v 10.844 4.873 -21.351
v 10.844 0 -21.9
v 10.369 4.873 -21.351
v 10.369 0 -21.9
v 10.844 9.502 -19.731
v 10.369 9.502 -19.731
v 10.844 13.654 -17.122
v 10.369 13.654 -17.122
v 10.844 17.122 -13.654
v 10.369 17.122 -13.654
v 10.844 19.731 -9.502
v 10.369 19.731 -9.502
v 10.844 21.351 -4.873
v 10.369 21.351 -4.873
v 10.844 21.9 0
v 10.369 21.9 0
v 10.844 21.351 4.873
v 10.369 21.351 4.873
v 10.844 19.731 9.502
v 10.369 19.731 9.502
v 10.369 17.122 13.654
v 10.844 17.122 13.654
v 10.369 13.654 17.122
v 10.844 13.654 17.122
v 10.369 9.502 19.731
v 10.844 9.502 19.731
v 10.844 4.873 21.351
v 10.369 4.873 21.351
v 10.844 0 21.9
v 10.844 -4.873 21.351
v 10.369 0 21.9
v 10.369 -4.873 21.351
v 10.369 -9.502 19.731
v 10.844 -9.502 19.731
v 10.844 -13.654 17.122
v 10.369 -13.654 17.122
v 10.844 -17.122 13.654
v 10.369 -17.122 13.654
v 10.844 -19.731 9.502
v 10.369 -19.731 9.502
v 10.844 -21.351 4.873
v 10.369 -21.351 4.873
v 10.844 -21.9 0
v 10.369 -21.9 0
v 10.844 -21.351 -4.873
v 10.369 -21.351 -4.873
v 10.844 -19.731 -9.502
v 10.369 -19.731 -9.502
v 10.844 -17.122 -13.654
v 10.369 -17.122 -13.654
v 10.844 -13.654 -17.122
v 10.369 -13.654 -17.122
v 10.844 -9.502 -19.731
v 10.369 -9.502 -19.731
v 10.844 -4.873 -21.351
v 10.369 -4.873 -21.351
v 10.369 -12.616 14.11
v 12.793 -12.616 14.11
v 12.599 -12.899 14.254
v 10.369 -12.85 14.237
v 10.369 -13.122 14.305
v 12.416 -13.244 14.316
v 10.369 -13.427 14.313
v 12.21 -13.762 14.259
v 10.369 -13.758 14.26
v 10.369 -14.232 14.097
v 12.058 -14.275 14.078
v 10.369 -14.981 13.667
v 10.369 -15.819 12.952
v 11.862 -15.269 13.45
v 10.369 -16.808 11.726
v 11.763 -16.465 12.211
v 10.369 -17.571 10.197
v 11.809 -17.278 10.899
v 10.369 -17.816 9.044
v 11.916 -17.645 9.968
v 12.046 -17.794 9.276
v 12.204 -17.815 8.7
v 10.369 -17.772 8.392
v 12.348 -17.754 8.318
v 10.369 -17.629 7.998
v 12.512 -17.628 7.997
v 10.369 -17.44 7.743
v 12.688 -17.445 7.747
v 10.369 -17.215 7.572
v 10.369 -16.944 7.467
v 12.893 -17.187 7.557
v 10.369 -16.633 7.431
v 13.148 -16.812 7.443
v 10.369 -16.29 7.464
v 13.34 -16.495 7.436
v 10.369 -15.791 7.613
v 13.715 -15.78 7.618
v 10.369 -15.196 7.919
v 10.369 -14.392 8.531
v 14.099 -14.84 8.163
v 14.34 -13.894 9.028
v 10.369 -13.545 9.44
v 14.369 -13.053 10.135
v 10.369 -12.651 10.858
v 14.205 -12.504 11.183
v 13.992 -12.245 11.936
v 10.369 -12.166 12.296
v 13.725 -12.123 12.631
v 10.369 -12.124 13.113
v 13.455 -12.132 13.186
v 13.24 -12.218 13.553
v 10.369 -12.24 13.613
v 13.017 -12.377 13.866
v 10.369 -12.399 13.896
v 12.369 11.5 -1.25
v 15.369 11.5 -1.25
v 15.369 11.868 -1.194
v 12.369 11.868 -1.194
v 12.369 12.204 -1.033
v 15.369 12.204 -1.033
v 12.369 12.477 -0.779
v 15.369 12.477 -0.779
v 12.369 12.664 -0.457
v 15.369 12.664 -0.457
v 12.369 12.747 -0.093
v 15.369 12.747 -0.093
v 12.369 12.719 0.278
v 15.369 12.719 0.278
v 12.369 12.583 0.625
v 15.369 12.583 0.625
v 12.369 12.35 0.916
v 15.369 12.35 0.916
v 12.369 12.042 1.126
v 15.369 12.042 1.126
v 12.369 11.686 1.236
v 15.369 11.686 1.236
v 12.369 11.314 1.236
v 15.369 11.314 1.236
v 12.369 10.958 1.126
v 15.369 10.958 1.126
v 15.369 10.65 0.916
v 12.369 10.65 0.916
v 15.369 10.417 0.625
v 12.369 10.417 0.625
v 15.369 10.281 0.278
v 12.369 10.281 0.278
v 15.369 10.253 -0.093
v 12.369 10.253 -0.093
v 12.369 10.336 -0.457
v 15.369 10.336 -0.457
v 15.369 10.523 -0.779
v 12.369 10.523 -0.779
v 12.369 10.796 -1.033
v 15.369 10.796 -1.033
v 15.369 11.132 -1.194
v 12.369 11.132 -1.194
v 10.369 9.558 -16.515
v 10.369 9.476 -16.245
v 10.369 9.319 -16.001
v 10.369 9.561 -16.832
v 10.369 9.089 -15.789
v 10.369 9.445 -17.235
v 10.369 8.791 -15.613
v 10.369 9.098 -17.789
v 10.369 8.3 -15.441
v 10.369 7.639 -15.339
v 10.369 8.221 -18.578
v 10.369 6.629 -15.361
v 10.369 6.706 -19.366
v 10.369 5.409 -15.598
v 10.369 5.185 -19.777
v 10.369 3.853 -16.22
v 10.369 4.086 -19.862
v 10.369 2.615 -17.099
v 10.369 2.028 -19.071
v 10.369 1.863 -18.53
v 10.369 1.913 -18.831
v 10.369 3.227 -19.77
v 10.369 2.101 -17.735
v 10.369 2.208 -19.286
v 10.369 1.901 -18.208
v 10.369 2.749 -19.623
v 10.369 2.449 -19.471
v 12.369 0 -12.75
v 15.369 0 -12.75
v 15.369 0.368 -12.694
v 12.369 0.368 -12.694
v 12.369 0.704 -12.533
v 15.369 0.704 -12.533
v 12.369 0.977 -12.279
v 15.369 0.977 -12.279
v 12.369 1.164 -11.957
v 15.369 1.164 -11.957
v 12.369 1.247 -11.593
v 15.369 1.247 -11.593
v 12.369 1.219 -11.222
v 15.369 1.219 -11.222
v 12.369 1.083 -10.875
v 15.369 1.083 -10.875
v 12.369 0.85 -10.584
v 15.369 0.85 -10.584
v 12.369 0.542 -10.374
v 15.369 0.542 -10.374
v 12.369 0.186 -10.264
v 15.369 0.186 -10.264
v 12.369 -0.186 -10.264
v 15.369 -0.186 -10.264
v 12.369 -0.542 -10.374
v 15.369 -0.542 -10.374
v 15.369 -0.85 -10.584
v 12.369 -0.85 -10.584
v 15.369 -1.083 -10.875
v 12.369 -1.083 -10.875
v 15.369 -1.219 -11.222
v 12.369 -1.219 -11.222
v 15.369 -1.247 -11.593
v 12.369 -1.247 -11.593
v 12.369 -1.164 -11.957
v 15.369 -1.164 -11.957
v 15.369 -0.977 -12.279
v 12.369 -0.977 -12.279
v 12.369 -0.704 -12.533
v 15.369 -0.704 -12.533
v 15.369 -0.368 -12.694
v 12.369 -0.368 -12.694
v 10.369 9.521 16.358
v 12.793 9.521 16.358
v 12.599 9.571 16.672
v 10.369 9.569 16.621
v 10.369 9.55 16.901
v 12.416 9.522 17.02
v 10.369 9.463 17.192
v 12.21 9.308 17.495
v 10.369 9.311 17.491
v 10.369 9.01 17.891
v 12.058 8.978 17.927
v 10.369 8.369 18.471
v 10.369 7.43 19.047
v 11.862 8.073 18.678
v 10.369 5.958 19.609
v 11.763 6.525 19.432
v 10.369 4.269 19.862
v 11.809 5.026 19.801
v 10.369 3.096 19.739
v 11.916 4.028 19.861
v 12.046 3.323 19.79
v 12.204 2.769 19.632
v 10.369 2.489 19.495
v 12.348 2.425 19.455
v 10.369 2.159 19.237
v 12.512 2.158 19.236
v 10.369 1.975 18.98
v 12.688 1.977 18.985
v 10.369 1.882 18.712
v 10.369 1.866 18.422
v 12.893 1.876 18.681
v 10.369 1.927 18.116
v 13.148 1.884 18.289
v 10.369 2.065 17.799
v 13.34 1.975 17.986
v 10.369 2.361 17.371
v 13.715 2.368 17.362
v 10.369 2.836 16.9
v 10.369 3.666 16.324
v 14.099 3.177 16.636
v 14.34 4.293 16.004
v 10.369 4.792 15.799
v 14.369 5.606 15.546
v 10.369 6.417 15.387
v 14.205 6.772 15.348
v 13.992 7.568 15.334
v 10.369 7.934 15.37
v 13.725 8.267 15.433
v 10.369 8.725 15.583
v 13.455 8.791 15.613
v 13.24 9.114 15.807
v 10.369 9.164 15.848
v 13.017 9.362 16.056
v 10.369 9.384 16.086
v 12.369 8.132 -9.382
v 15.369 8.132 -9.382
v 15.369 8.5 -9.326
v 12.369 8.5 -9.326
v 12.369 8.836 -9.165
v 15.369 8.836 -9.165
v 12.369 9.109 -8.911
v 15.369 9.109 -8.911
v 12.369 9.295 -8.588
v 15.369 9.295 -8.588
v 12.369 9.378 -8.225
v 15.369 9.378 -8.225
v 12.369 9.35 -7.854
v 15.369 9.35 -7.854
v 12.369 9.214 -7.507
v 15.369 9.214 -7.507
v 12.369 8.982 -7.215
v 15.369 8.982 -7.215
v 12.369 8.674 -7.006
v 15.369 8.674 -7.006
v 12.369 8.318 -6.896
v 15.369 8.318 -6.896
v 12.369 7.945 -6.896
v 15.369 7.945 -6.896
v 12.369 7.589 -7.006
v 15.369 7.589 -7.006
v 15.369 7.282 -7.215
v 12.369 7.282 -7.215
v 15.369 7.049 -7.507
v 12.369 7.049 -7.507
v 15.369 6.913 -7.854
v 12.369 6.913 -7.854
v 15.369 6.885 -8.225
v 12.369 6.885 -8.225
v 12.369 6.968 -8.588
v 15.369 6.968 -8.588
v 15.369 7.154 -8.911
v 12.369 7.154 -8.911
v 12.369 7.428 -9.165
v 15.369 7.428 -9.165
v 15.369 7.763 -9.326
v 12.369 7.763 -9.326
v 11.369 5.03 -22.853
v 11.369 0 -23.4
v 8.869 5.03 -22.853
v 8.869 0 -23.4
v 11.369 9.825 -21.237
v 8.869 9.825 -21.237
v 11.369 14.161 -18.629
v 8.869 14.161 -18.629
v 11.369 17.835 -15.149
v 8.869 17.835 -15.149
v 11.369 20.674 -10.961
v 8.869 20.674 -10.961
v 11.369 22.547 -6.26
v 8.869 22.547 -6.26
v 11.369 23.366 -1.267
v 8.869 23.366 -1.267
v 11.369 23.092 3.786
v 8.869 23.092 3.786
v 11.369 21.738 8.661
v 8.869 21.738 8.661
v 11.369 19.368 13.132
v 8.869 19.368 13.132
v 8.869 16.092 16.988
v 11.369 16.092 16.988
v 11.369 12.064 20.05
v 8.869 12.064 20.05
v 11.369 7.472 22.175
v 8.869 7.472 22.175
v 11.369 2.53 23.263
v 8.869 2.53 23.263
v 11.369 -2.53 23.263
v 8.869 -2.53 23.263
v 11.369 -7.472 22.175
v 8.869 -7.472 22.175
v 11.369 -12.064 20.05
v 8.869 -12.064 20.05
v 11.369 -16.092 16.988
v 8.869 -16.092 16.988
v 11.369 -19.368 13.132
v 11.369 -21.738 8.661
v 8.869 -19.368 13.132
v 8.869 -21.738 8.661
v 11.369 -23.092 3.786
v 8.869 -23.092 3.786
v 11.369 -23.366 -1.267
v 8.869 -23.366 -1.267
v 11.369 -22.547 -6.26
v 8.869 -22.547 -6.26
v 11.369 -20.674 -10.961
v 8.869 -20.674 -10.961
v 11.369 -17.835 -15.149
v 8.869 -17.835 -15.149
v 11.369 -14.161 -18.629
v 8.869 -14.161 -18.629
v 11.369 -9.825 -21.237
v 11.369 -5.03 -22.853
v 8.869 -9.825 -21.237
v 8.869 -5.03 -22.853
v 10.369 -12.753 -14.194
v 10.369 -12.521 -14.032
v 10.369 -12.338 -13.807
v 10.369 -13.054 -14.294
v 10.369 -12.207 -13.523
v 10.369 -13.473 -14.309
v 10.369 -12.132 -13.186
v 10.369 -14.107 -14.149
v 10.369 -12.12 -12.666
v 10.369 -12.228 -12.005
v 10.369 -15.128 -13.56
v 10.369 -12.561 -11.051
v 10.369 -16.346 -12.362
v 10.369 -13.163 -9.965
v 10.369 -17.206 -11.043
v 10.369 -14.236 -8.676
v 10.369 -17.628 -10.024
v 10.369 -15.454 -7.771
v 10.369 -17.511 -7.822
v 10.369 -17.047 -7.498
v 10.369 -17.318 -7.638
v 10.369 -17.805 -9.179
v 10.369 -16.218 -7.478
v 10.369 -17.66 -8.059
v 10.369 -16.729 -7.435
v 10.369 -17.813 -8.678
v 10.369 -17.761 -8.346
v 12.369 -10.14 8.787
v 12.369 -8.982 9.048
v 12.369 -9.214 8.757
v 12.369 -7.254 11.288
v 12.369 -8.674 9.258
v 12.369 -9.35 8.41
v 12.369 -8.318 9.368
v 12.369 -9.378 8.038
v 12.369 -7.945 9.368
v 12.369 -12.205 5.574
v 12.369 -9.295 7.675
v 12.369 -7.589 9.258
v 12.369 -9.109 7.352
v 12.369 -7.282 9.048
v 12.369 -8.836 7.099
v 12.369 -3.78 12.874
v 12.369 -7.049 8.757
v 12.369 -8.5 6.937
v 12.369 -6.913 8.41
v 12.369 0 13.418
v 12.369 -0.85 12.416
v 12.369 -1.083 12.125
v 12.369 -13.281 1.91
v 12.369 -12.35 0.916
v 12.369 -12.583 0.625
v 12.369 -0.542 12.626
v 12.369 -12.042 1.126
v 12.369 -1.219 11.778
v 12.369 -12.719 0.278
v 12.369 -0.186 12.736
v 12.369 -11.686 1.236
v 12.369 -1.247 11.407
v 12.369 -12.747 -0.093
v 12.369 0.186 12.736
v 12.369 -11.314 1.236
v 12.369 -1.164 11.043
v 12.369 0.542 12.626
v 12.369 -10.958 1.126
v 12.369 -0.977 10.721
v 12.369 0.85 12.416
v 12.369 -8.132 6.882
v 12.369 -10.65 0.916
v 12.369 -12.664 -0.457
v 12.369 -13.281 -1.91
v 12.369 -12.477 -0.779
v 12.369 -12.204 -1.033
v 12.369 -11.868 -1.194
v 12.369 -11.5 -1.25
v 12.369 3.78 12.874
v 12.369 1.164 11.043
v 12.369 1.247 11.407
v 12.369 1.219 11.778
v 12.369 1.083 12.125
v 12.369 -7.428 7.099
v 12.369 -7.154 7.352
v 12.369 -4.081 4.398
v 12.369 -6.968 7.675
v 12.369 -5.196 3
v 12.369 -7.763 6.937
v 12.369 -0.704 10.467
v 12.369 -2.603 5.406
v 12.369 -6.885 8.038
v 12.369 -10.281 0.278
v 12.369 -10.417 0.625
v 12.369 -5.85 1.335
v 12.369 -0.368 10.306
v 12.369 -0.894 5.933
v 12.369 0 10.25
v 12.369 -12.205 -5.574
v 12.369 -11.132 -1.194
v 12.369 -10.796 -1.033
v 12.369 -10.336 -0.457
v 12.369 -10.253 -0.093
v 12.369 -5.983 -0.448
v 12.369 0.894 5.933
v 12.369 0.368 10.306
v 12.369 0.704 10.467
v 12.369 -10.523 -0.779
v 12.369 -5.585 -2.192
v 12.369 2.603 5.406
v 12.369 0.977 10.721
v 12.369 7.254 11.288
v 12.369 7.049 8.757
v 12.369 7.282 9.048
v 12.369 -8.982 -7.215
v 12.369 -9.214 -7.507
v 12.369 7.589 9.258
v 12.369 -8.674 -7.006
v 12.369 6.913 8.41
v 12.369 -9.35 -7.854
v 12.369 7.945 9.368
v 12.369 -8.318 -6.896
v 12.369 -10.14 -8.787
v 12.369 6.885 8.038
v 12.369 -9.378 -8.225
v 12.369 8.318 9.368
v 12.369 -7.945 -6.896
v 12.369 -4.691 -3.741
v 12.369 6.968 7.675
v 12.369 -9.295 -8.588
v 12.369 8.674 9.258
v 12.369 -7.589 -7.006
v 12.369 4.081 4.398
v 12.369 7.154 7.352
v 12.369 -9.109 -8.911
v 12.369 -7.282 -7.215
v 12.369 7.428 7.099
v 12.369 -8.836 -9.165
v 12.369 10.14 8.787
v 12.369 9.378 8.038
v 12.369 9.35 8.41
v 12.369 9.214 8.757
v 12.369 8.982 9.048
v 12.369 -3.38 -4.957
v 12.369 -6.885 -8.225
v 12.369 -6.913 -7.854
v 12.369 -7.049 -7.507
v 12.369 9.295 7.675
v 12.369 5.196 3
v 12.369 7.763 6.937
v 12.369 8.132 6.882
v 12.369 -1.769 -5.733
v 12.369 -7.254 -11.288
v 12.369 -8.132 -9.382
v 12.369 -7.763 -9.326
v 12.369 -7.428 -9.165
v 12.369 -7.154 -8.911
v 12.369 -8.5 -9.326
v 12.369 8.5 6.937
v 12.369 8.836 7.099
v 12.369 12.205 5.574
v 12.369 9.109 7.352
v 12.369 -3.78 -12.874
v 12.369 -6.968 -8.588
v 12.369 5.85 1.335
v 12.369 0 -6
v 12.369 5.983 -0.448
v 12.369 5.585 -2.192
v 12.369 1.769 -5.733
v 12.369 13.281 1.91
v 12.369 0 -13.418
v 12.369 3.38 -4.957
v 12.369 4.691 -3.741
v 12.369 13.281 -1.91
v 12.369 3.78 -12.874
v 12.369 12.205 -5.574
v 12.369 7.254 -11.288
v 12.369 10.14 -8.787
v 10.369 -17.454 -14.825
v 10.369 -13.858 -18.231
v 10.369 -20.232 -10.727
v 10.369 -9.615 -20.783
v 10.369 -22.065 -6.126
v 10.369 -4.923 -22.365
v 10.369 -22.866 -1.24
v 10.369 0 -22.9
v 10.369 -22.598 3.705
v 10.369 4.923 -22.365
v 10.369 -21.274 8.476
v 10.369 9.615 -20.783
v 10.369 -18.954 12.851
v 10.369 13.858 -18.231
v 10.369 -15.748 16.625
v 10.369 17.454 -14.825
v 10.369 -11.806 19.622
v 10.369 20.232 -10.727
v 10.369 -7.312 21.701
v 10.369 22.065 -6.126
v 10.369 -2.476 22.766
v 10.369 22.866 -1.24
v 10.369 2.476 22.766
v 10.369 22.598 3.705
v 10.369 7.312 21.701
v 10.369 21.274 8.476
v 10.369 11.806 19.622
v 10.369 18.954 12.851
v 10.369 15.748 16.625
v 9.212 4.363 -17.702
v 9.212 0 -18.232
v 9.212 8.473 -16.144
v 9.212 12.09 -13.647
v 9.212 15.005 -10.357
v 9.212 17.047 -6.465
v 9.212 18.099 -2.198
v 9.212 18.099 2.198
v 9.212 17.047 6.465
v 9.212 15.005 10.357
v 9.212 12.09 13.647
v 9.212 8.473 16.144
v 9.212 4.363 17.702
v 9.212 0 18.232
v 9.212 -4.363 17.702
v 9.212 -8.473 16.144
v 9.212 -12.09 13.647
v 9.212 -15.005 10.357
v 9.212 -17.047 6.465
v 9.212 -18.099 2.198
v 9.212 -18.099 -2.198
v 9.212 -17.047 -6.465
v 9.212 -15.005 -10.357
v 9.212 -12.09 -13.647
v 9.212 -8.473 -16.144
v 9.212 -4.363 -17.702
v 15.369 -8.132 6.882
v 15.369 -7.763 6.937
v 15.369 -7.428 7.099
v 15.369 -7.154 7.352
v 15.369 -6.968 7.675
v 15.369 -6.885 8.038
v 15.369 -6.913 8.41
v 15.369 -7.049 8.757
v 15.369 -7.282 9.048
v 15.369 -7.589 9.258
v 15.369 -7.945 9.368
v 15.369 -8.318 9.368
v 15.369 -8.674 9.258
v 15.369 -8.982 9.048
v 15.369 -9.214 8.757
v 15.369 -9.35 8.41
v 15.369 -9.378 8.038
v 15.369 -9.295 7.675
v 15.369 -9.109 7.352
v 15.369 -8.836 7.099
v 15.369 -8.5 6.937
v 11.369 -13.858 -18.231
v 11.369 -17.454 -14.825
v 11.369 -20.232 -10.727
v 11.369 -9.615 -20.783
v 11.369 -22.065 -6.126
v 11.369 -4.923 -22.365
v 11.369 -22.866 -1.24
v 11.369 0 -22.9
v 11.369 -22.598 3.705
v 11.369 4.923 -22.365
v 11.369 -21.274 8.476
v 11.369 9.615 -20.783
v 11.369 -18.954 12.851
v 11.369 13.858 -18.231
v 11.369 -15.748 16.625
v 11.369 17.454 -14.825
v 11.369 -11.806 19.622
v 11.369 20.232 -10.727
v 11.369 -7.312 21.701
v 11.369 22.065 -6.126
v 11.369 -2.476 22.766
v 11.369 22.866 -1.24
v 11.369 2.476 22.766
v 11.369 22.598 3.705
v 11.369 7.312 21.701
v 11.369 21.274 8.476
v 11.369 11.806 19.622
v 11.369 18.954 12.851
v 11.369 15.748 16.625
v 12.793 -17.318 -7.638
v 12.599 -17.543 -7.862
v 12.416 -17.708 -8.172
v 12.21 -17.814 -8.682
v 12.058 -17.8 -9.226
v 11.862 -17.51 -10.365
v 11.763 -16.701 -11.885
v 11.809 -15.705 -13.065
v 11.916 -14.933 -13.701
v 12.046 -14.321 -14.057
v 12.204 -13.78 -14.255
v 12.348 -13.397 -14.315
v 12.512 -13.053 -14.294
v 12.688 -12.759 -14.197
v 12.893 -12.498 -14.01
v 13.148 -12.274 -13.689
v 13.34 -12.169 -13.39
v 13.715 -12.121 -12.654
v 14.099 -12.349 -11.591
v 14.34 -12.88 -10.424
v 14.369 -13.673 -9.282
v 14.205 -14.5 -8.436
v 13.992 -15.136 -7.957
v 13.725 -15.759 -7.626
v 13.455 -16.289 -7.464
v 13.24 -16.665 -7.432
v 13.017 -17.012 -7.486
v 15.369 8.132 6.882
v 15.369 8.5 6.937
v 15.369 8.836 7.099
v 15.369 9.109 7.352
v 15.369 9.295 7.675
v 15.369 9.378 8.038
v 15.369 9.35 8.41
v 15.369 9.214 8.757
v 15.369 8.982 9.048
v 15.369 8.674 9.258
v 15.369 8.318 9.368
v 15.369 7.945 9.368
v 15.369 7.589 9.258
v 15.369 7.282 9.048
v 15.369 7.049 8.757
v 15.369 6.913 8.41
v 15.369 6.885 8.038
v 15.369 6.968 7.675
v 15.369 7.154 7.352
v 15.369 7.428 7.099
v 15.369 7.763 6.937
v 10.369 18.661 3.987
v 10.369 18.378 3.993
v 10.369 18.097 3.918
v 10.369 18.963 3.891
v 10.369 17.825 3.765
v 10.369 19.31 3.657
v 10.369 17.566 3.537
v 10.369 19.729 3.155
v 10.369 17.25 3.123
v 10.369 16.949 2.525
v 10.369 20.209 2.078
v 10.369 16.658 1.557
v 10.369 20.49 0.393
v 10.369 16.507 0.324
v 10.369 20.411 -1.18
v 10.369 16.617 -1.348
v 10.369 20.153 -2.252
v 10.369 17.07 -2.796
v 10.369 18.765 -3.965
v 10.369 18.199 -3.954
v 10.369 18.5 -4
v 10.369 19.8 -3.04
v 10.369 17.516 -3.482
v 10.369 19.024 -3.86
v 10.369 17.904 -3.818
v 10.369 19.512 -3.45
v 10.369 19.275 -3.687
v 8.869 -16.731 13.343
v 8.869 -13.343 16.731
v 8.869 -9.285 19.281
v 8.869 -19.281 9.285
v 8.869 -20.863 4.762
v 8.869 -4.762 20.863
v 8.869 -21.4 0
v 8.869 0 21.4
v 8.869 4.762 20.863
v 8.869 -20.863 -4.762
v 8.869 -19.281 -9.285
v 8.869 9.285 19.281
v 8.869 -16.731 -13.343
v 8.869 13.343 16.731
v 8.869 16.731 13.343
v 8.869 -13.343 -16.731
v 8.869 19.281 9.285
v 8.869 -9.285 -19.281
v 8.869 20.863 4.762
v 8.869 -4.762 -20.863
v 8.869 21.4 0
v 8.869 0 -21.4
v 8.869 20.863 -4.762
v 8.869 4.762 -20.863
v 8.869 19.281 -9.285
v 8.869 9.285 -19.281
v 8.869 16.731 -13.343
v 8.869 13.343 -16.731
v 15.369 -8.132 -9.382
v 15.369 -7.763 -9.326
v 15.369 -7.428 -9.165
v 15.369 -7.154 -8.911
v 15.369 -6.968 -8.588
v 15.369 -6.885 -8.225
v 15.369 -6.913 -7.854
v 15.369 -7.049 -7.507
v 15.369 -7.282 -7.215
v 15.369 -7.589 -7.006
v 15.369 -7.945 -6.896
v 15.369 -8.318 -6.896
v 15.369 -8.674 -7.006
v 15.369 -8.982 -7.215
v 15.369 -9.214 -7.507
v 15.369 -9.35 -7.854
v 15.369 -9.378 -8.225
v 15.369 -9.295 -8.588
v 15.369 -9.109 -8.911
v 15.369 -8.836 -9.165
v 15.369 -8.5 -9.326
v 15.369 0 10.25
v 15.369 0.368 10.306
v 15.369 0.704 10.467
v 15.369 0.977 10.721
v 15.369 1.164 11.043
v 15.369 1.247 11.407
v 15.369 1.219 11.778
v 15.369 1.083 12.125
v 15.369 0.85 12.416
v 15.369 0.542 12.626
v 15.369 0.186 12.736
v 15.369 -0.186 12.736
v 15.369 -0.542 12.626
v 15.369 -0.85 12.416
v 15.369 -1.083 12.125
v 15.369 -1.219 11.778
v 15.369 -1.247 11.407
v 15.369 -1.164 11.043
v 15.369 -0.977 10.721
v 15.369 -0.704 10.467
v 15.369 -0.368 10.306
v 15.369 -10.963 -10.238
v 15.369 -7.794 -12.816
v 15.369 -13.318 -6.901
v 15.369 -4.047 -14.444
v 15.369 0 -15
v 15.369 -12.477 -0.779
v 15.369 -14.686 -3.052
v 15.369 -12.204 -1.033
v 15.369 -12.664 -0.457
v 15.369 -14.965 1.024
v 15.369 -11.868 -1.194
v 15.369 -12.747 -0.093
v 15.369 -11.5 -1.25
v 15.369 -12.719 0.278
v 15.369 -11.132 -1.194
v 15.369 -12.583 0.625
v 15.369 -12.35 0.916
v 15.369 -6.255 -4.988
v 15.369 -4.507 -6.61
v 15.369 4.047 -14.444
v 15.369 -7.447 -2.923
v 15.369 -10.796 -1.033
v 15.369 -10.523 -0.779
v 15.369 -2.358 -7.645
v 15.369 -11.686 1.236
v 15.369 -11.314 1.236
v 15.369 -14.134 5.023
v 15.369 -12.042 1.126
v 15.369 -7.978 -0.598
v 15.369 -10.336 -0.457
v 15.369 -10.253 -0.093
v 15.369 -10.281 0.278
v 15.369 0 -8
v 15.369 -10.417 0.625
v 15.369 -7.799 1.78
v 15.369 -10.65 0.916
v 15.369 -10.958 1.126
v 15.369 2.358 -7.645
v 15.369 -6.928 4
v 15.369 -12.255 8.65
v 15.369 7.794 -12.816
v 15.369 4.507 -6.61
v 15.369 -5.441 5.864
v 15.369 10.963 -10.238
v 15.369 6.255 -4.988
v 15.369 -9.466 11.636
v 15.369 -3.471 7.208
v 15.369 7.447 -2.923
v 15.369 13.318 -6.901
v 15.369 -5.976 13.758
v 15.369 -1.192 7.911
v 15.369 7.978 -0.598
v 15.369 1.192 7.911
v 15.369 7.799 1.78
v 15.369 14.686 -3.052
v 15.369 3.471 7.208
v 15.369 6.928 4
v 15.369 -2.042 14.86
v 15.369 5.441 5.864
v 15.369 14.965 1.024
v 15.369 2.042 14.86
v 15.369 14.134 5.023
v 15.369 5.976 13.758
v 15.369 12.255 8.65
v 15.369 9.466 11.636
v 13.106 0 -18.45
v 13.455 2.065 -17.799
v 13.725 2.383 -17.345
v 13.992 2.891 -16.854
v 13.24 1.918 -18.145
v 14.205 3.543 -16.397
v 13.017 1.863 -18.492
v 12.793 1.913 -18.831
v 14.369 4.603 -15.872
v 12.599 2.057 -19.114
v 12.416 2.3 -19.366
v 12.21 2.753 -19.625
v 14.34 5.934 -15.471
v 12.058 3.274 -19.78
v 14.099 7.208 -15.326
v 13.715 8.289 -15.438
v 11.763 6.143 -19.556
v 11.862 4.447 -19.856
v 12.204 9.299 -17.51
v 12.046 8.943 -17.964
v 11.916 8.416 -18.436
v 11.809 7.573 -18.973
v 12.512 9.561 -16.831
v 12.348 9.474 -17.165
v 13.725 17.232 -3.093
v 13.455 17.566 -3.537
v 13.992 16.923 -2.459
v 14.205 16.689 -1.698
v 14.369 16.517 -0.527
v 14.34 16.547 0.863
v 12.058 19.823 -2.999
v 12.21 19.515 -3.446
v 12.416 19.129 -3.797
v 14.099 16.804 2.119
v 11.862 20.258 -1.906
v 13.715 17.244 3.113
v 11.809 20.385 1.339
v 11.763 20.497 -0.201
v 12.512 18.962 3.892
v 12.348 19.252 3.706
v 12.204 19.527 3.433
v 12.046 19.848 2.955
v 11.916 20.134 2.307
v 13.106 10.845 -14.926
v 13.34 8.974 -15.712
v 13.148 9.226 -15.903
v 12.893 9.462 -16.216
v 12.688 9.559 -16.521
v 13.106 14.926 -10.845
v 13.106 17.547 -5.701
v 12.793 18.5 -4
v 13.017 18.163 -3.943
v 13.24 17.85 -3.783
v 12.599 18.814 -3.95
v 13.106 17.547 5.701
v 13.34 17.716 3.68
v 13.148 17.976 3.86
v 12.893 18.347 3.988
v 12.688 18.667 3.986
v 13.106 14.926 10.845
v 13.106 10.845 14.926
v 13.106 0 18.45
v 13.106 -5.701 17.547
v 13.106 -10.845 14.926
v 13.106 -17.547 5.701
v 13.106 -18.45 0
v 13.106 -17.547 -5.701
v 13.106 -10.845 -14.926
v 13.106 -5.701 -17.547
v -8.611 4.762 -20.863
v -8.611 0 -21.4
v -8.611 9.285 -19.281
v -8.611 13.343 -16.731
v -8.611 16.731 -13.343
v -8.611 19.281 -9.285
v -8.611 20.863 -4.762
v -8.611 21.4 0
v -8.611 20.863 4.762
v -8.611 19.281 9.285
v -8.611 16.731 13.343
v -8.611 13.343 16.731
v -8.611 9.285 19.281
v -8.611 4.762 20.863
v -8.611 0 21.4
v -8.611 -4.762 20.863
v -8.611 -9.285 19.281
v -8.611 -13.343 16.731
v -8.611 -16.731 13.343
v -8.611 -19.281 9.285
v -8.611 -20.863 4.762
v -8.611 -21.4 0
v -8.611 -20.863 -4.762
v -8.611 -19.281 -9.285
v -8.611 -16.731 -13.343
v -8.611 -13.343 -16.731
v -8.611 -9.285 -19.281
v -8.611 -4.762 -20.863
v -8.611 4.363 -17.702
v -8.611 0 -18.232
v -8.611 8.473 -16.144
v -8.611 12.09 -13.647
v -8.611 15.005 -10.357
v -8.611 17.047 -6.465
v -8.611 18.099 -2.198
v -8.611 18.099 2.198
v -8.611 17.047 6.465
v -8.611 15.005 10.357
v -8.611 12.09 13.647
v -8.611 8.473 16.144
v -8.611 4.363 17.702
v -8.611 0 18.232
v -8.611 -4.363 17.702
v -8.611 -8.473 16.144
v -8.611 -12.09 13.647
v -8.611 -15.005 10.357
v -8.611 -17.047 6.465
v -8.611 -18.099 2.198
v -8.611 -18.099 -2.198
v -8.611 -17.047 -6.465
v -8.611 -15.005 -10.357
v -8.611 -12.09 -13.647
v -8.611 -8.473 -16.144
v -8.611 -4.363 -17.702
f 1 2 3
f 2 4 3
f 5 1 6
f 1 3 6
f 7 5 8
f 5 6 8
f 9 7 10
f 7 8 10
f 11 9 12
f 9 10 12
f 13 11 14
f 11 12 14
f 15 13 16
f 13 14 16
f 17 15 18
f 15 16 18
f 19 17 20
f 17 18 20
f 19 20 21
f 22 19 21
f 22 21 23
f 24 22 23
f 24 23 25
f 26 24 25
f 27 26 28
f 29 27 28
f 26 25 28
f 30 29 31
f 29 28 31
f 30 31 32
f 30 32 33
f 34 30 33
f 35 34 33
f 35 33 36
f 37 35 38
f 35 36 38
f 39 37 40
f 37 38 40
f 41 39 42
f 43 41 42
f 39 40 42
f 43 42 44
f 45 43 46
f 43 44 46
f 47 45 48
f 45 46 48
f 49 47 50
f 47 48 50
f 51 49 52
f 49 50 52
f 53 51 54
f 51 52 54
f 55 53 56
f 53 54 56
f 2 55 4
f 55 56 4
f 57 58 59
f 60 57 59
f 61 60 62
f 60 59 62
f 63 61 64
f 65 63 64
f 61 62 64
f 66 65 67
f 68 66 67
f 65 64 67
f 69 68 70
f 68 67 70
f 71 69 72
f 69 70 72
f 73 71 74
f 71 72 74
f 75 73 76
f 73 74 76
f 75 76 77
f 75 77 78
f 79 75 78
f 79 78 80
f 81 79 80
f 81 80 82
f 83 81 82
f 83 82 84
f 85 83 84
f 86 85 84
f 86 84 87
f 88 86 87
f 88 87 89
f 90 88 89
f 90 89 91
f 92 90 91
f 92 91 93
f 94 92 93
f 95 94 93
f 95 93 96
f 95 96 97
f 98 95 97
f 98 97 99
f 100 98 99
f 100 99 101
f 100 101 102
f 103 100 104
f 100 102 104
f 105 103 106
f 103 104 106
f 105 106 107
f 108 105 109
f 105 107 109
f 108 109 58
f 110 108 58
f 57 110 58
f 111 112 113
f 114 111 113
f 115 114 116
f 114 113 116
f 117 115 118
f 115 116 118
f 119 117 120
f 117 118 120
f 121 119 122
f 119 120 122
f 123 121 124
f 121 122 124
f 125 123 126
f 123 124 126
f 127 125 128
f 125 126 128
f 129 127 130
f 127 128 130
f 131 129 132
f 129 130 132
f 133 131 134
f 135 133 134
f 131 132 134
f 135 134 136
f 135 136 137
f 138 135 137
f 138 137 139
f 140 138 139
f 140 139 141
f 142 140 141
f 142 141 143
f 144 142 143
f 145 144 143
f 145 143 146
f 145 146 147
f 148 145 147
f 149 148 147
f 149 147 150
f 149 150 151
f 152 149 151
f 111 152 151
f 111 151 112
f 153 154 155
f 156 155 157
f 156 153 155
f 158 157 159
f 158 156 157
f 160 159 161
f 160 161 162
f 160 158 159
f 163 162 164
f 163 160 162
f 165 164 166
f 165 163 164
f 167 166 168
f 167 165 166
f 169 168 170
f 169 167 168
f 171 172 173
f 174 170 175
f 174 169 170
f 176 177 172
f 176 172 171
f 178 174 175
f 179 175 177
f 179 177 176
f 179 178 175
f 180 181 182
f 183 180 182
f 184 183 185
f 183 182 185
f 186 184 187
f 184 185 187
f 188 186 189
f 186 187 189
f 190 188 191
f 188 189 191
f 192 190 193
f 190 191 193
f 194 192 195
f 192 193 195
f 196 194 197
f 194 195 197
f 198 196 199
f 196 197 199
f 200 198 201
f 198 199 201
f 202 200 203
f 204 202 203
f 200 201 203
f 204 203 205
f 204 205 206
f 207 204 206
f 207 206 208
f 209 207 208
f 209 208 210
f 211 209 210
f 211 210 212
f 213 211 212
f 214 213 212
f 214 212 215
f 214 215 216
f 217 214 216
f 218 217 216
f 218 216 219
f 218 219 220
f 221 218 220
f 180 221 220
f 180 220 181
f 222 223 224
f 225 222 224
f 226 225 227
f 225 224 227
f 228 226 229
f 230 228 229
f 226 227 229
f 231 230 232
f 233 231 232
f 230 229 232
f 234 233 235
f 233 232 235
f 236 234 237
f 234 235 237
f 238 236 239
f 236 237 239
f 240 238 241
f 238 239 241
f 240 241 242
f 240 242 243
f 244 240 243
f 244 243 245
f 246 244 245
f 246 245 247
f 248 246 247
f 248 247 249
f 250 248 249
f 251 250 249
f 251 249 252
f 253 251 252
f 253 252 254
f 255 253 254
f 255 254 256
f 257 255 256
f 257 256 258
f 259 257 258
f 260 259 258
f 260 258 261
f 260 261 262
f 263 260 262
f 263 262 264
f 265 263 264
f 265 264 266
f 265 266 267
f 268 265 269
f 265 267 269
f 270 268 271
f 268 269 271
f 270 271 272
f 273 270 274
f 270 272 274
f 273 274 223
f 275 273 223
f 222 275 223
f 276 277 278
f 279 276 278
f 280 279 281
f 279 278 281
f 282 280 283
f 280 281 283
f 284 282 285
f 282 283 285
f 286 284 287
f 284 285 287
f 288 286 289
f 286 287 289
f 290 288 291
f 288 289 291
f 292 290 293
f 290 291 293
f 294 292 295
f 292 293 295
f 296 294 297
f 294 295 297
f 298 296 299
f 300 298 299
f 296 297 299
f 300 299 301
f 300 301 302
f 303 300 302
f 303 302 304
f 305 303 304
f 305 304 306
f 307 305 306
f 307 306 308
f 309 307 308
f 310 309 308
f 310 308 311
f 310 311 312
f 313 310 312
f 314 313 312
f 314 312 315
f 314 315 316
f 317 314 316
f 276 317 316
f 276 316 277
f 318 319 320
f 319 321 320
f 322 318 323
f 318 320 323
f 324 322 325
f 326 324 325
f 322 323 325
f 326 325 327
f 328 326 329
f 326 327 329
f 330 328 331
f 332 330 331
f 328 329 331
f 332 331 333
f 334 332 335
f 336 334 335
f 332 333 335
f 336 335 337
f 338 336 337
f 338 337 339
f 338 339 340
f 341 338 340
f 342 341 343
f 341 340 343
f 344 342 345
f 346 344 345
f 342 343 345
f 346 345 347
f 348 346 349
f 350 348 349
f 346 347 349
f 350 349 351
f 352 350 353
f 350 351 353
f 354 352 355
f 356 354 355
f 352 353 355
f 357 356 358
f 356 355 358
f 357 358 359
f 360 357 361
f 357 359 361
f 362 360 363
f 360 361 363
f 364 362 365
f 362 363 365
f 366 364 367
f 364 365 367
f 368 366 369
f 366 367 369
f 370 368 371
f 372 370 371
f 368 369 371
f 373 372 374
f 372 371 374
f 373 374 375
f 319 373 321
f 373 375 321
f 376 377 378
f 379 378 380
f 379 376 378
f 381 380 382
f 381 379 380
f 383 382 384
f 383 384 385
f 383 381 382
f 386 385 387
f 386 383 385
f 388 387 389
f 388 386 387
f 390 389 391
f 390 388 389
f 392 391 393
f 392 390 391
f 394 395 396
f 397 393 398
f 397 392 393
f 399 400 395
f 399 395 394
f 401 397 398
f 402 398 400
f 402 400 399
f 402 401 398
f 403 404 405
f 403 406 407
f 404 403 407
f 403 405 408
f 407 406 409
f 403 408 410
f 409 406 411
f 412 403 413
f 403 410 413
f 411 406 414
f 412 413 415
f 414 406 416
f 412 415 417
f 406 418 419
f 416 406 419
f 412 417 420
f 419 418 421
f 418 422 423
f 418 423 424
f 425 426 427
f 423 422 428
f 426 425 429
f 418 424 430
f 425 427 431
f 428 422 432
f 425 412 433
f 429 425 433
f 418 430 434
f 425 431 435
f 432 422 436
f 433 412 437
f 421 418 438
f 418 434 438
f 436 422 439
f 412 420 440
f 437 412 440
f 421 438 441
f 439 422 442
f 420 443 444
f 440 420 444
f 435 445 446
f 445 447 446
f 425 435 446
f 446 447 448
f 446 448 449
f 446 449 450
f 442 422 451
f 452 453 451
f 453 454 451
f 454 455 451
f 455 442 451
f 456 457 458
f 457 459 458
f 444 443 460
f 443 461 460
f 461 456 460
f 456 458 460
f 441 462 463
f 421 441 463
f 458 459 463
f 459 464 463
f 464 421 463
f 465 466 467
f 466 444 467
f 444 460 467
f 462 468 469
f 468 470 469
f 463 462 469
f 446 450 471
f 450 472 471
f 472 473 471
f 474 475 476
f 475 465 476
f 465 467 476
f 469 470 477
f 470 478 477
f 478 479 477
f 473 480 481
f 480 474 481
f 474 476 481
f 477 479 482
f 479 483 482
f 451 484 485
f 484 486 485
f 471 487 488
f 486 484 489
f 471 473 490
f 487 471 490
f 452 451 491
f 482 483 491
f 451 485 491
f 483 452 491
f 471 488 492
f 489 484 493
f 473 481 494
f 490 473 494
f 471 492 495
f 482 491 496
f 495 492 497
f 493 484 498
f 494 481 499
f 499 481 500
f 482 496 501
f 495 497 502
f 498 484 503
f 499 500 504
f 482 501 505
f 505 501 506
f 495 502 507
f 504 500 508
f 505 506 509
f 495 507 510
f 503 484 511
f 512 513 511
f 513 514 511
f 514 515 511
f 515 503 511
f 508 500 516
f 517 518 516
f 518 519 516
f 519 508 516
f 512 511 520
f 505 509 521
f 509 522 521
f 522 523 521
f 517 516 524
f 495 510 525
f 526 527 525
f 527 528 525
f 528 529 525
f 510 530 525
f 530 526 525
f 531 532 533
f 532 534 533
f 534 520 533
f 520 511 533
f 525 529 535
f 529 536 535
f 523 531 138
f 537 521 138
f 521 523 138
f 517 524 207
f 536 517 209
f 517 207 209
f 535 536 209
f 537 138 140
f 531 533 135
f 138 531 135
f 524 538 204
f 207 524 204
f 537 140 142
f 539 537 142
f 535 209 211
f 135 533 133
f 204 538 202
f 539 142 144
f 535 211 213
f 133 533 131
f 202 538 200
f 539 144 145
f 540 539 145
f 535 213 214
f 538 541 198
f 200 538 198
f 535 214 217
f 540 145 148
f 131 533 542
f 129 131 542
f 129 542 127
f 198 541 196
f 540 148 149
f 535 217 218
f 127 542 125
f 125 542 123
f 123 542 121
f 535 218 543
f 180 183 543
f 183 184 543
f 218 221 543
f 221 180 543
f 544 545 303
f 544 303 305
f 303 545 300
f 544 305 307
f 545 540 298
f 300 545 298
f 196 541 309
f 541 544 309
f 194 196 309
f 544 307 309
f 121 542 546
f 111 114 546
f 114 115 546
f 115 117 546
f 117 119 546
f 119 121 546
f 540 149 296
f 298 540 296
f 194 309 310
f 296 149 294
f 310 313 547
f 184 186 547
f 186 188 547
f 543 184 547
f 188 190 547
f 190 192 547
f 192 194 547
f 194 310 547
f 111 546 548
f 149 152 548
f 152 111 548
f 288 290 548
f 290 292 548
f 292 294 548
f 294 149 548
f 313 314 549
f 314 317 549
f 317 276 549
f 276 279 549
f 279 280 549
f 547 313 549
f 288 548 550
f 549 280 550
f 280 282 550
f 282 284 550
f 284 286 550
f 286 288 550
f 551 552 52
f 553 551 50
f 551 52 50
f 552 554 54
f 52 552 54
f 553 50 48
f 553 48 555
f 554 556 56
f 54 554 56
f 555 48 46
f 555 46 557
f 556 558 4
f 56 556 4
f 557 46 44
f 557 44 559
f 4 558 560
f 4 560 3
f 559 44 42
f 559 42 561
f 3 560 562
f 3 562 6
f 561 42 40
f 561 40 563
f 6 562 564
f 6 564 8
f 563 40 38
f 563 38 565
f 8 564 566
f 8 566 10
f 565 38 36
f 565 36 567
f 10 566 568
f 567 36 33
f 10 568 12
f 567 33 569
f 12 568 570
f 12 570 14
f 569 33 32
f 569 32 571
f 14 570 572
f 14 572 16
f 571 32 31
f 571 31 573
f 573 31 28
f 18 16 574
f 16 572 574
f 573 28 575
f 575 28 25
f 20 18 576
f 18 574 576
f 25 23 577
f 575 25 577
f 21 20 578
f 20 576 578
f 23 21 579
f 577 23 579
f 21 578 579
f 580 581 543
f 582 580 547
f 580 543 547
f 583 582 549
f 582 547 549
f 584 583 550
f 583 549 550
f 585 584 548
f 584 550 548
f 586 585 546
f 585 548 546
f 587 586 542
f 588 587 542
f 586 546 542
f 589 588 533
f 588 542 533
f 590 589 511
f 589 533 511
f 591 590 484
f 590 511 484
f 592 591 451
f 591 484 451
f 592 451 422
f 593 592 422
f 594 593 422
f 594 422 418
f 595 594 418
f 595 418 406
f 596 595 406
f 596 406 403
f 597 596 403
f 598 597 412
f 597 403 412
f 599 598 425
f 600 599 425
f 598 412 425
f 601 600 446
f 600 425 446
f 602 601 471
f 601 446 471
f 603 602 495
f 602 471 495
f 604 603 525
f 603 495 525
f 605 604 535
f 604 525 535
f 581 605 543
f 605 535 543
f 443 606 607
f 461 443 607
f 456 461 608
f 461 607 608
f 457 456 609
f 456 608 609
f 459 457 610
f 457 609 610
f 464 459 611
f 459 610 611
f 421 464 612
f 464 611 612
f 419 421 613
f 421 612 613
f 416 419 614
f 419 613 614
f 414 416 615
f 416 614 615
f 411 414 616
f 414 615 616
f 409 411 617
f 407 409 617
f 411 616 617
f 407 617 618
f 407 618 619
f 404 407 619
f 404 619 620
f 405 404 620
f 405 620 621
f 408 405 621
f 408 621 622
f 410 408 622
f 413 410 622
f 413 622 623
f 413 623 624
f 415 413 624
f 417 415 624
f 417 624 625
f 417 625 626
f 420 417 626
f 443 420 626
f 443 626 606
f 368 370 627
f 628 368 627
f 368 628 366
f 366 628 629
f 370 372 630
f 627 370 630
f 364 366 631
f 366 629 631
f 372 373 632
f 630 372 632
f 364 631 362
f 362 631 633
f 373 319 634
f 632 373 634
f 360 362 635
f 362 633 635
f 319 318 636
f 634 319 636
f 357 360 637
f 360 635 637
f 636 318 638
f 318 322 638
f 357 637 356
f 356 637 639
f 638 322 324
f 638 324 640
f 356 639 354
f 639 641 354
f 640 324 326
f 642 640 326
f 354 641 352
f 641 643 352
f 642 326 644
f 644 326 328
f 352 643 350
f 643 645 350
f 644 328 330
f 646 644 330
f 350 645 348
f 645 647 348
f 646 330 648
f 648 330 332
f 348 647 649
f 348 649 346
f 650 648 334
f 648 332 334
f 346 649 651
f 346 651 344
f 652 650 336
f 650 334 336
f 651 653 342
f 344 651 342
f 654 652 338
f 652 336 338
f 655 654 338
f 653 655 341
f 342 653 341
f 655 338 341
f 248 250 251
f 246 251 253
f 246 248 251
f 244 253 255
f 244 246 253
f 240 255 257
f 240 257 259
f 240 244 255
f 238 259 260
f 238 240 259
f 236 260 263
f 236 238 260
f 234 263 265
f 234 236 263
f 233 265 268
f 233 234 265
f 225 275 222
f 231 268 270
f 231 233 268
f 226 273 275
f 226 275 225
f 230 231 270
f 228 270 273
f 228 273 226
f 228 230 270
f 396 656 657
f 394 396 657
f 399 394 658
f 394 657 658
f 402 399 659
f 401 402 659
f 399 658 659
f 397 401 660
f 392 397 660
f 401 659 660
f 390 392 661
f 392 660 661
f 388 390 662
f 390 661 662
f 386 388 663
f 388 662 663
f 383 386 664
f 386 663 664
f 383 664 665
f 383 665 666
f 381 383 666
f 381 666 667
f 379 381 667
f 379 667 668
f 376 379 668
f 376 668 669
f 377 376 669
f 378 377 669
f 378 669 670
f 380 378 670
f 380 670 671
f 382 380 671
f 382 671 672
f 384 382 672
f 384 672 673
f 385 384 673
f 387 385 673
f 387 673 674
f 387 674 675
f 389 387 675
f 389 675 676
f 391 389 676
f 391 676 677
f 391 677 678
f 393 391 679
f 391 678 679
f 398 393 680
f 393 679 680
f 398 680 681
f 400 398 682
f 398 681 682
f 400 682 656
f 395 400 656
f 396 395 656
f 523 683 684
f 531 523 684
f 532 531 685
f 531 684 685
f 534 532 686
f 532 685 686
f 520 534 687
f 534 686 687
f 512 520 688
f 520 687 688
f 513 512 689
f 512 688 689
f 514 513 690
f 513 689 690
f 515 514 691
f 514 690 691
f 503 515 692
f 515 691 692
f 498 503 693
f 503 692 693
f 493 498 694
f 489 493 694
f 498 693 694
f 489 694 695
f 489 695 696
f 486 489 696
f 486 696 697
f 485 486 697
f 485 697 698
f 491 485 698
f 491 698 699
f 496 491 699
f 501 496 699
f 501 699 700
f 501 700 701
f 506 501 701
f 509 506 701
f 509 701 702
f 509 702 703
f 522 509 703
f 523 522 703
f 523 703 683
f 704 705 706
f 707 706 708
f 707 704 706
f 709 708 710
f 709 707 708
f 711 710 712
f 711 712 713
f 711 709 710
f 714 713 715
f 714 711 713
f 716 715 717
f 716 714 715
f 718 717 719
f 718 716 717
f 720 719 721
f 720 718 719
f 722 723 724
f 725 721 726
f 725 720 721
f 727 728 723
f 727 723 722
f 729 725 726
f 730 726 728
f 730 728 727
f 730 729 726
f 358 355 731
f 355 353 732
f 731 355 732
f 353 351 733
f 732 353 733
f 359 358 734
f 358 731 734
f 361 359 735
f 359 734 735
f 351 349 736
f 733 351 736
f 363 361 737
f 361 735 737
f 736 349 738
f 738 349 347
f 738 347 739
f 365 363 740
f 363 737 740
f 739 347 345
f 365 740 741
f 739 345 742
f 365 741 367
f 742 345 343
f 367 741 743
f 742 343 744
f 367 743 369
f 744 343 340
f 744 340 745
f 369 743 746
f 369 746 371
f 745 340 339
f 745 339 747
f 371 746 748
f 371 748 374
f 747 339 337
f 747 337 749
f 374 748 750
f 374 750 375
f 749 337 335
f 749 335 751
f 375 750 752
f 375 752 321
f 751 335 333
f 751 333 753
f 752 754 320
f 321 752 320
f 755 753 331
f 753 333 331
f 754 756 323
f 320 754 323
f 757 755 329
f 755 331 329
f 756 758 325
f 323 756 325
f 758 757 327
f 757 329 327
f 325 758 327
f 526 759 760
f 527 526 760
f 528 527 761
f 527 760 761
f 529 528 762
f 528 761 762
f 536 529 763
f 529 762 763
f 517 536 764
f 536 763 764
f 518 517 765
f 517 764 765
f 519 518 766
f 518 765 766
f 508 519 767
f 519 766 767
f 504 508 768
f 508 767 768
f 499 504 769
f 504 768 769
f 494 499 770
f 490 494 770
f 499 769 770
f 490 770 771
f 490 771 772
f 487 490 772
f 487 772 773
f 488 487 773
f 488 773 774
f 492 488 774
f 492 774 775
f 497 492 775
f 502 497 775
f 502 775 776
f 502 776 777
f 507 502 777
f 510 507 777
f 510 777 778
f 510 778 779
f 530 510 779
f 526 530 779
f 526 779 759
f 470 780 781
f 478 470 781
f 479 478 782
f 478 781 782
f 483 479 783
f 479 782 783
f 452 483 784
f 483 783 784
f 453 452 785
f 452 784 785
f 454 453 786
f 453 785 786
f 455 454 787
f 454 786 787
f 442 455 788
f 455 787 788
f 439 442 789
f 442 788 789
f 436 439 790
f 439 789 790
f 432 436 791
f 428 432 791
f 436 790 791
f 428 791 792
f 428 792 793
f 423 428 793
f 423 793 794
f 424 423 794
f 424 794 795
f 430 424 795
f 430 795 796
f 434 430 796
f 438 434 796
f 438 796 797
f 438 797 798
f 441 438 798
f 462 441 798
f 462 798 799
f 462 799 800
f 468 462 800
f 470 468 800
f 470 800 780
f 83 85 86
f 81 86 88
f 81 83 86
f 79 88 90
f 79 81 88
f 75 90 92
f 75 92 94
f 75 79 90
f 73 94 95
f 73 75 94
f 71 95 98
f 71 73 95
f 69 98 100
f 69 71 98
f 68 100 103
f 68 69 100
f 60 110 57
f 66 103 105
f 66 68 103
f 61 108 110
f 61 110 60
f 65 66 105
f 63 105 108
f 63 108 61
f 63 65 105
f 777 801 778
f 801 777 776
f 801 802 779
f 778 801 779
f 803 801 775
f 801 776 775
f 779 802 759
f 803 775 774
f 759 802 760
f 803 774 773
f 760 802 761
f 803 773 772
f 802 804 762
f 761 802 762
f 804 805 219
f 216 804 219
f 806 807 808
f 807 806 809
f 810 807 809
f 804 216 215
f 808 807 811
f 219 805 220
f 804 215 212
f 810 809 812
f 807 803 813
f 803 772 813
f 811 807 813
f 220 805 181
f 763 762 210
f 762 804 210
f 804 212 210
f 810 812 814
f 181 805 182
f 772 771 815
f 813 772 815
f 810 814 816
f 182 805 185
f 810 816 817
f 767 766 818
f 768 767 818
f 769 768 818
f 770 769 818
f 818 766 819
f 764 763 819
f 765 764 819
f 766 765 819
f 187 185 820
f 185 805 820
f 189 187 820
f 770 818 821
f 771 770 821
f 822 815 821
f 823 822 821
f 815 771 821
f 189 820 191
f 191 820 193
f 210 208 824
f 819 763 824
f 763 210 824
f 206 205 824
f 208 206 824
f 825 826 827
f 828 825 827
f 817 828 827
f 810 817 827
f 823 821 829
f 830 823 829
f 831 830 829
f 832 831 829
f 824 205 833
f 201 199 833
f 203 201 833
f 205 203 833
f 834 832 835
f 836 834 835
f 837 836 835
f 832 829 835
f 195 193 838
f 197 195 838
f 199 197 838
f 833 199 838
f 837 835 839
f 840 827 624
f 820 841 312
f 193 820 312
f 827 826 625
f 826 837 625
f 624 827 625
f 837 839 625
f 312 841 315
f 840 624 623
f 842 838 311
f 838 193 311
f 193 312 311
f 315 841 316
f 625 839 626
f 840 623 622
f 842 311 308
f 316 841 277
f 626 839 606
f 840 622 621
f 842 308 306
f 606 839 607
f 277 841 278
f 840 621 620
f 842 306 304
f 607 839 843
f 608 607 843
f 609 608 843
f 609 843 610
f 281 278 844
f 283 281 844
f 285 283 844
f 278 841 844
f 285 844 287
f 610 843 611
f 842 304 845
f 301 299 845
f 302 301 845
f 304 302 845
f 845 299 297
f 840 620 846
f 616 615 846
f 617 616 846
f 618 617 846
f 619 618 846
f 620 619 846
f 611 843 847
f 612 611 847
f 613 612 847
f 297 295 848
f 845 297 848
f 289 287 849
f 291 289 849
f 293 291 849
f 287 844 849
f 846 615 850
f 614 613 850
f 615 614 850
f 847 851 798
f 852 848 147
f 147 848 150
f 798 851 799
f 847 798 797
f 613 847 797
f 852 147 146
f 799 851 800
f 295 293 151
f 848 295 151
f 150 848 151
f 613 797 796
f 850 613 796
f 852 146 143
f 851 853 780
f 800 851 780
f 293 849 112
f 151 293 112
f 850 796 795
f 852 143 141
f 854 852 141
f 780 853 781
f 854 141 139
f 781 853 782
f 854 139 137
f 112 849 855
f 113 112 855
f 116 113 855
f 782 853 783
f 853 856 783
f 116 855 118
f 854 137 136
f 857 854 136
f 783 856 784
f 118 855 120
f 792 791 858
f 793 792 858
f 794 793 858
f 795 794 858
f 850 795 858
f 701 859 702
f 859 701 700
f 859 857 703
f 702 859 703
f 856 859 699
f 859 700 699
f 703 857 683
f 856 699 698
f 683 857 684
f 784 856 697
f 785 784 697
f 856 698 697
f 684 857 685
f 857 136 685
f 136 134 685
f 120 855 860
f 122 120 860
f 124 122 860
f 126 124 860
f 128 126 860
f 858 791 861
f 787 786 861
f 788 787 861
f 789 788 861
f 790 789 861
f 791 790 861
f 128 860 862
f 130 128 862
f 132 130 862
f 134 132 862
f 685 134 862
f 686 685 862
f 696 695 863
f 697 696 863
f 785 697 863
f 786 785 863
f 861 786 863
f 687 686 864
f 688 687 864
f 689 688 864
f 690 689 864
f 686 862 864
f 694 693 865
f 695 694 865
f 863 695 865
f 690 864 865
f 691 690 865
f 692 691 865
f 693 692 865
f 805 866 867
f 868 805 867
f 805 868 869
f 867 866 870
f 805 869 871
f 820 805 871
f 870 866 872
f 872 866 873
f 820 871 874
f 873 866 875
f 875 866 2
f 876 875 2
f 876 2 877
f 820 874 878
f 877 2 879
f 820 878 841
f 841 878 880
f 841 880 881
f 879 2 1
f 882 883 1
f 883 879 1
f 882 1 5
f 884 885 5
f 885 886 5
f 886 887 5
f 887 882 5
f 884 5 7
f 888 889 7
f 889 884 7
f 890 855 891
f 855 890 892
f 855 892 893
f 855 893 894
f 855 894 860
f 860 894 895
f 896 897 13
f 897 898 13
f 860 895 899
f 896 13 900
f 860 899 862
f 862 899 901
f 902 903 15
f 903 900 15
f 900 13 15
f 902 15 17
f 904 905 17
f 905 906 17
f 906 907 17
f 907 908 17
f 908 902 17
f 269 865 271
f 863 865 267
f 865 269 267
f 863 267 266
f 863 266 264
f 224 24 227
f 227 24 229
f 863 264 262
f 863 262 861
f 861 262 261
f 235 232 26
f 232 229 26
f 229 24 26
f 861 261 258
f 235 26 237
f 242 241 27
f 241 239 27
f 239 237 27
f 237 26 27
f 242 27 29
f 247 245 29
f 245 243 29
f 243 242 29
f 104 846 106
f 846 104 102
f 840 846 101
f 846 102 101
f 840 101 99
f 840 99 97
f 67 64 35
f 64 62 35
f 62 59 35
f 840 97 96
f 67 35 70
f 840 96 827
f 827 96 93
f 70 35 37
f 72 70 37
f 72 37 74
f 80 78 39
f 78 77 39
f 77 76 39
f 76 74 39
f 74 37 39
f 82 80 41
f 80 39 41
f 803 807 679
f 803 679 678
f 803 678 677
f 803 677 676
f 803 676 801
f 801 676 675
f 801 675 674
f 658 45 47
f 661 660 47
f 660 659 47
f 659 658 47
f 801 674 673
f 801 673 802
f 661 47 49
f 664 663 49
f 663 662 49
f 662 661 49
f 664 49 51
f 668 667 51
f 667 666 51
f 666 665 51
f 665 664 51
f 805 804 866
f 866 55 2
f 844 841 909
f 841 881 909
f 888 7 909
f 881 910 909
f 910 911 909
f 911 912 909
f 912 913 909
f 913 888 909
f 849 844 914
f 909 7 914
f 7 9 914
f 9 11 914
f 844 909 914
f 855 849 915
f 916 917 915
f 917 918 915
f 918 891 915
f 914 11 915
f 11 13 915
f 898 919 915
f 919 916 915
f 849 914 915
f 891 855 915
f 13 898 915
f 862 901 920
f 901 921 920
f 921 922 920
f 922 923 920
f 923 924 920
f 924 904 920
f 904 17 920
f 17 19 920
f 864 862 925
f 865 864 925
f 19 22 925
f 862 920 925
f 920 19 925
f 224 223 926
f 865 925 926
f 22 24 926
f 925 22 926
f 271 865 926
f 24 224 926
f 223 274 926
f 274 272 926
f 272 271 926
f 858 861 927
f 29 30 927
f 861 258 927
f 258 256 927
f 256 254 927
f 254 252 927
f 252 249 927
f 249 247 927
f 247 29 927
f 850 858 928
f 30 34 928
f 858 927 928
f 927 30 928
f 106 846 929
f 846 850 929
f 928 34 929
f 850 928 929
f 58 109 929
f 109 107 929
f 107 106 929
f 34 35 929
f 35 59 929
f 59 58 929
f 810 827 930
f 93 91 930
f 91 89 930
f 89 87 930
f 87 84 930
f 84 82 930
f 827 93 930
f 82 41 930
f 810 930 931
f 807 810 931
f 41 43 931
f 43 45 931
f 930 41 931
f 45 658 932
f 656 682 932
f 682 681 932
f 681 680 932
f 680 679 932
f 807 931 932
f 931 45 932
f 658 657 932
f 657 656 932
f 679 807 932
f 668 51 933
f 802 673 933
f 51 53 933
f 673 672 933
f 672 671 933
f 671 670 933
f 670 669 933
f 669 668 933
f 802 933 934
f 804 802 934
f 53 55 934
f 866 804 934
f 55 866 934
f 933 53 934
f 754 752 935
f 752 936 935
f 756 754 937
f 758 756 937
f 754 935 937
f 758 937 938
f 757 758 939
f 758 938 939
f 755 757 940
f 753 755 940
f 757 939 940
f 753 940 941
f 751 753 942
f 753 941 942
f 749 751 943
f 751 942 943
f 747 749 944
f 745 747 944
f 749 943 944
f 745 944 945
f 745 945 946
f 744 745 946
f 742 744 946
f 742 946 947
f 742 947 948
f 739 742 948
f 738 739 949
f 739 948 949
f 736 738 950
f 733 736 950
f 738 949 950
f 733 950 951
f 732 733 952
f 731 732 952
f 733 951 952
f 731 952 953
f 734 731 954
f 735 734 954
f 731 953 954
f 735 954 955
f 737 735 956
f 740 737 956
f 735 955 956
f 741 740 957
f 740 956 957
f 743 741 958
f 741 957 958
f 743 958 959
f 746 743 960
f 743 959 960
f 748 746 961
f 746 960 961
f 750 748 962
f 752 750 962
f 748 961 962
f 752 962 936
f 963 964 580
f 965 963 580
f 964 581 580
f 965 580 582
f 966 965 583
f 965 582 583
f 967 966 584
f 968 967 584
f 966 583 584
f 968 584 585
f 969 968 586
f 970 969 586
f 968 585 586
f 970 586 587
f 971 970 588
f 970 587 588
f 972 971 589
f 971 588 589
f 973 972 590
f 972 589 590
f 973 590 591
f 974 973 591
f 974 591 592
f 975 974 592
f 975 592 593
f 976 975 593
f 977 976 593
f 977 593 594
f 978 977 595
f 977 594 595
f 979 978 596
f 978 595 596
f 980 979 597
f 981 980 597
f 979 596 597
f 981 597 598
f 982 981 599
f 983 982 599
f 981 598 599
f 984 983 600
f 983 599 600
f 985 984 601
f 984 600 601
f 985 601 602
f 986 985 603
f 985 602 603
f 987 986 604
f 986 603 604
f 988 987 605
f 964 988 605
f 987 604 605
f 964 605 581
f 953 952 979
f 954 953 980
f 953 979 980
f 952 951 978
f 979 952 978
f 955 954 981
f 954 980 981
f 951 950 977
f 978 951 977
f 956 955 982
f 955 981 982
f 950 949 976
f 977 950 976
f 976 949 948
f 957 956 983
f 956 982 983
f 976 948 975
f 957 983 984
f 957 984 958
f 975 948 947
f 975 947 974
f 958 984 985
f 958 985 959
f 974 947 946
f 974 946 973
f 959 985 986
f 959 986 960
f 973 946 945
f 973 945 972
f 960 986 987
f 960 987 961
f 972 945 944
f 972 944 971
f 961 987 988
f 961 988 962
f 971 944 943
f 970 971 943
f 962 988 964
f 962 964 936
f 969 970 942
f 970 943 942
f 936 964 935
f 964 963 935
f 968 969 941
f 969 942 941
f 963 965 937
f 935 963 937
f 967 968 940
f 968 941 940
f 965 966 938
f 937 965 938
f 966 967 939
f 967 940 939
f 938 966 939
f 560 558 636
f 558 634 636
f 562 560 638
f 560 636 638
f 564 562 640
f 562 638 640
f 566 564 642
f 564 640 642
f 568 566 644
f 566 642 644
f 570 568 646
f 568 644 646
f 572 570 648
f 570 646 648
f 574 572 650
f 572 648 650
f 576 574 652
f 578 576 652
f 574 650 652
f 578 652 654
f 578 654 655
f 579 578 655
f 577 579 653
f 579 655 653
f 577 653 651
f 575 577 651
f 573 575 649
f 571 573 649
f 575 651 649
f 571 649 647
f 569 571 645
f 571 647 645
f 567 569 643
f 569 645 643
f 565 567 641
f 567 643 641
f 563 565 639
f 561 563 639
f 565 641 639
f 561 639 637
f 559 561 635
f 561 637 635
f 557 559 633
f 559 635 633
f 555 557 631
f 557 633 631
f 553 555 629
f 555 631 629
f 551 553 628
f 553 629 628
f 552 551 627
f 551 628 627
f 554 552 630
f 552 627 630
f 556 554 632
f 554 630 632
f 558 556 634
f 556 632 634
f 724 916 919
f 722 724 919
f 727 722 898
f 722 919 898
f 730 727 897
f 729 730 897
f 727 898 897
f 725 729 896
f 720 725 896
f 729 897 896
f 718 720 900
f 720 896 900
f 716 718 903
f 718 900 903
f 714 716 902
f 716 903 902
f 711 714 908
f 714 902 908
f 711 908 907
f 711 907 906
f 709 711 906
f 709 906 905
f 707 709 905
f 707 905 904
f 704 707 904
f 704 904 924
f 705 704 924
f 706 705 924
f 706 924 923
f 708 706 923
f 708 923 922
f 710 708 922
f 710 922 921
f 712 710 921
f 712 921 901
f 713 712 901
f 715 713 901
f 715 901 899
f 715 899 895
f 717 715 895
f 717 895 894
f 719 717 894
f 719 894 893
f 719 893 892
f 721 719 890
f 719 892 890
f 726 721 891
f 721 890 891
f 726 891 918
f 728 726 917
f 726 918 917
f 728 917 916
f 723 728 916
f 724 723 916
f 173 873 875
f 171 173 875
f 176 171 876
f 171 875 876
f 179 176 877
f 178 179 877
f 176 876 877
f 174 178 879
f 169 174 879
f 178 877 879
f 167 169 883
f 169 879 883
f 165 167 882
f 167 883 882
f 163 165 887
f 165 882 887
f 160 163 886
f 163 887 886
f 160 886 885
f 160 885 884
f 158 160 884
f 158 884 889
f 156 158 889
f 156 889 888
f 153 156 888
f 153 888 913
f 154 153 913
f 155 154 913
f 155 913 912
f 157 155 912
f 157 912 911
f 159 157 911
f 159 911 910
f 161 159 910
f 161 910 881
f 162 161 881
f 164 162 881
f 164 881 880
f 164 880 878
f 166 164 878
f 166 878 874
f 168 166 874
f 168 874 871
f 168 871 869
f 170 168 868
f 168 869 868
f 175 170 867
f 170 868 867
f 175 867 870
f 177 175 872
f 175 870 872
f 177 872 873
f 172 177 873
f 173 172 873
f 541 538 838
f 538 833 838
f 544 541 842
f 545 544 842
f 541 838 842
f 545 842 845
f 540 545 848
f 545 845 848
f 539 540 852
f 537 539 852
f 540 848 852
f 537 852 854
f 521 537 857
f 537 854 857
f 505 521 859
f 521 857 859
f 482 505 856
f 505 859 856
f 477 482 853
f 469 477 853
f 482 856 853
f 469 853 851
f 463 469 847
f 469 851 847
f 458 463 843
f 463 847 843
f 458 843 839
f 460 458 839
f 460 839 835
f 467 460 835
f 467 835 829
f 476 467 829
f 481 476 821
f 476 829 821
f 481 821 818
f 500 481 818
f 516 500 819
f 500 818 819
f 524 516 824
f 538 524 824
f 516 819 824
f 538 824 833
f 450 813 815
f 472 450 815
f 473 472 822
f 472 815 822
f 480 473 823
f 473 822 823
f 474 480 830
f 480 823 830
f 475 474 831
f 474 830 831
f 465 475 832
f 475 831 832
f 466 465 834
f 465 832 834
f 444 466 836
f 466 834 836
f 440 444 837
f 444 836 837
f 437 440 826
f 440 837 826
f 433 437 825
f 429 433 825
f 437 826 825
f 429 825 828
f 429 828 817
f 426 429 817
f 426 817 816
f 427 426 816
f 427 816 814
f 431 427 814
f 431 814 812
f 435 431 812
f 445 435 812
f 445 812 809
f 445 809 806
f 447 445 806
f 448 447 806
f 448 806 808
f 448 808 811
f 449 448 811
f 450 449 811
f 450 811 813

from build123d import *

# Parameters (mm, degrees)
SKETCH4_R          = 1.25
SKETCH4_RX         = 4
SKETCH4_RY         = 2
CUT_EXTRUDE1_DEPTH = 5


with BuildPart() as part:
    # Sketch3 → Revolve1 (revolve)
    with BuildSketch(Plane(origin=(0, 0, 0), x_dir=(1, 0, 0), z_dir=(0, 1, 0))):
        Polygon((10.36932978, 23.4), (8.86932978, 23.4), (8.86932978, 21.4), (-8.61067022, 21.4), (-8.61067022, 18.231946605), (9.211549898, 18.231946605), (12.36932978, 13.417613419), (12.36932978, 6), (15.36932978, 8), (15.36932978, 15), (10.843535586, 21.9), (10.36932978, 21.9), (10.36932978, 22.9), (11.36932978, 22.9), (11.36932978, 23.4), align=None)
    revolve(axis=Axis((-29.774212385, 0, 0), (1, 0, 0)))

    # Sketch4 → Cut-Extrude1 (cut)
    with BuildSketch(Plane(origin=(15.36932978, 0, 0), x_dir=(0, 0, -1), z_dir=(1, 0, 0))):
        with Locations((0, 11.5)):
            Circle(SKETCH4_R)
        with Locations((8.131727984, 8.131727984)):
            Circle(SKETCH4_R)
        with Locations((11.5, 0)):
            Circle(SKETCH4_R)
        with Locations((8.131727984, -8.131727984)):
            Circle(SKETCH4_R)
        with Locations((0, -11.5)):
            Circle(SKETCH4_R)
        with Locations((-8.131727984, -8.131727984)):
            Circle(SKETCH4_R)
        with Locations((-11.5, 0)):
            Circle(SKETCH4_R)
        with Locations((-8.131727984, 8.131727984)):
            Circle(SKETCH4_R)
        with Locations((0, 18.5)):
            Ellipse(SKETCH4_RX, SKETCH4_RY)
        with Locations(Location((17.594545551, 5.716814396), (0, 0, -72))):
            Ellipse(SKETCH4_RX, SKETCH4_RY)
        with Locations(Location((10.874027167, -14.966814396), (0, 0, -144))):
            Ellipse(SKETCH4_RX, SKETCH4_RY)
        with Locations(Location((-10.874027167, -14.966814396), (0, 0, 144))):
            Ellipse(SKETCH4_RX, SKETCH4_RY)
        with Locations(Location((-17.594545551, 5.716814396), (0, 0, 72))):
            Ellipse(SKETCH4_RX, SKETCH4_RY)
    extrude(amount=-CUT_EXTRUDE1_DEPTH, mode=Mode.SUBTRACT)


solid = part.part
